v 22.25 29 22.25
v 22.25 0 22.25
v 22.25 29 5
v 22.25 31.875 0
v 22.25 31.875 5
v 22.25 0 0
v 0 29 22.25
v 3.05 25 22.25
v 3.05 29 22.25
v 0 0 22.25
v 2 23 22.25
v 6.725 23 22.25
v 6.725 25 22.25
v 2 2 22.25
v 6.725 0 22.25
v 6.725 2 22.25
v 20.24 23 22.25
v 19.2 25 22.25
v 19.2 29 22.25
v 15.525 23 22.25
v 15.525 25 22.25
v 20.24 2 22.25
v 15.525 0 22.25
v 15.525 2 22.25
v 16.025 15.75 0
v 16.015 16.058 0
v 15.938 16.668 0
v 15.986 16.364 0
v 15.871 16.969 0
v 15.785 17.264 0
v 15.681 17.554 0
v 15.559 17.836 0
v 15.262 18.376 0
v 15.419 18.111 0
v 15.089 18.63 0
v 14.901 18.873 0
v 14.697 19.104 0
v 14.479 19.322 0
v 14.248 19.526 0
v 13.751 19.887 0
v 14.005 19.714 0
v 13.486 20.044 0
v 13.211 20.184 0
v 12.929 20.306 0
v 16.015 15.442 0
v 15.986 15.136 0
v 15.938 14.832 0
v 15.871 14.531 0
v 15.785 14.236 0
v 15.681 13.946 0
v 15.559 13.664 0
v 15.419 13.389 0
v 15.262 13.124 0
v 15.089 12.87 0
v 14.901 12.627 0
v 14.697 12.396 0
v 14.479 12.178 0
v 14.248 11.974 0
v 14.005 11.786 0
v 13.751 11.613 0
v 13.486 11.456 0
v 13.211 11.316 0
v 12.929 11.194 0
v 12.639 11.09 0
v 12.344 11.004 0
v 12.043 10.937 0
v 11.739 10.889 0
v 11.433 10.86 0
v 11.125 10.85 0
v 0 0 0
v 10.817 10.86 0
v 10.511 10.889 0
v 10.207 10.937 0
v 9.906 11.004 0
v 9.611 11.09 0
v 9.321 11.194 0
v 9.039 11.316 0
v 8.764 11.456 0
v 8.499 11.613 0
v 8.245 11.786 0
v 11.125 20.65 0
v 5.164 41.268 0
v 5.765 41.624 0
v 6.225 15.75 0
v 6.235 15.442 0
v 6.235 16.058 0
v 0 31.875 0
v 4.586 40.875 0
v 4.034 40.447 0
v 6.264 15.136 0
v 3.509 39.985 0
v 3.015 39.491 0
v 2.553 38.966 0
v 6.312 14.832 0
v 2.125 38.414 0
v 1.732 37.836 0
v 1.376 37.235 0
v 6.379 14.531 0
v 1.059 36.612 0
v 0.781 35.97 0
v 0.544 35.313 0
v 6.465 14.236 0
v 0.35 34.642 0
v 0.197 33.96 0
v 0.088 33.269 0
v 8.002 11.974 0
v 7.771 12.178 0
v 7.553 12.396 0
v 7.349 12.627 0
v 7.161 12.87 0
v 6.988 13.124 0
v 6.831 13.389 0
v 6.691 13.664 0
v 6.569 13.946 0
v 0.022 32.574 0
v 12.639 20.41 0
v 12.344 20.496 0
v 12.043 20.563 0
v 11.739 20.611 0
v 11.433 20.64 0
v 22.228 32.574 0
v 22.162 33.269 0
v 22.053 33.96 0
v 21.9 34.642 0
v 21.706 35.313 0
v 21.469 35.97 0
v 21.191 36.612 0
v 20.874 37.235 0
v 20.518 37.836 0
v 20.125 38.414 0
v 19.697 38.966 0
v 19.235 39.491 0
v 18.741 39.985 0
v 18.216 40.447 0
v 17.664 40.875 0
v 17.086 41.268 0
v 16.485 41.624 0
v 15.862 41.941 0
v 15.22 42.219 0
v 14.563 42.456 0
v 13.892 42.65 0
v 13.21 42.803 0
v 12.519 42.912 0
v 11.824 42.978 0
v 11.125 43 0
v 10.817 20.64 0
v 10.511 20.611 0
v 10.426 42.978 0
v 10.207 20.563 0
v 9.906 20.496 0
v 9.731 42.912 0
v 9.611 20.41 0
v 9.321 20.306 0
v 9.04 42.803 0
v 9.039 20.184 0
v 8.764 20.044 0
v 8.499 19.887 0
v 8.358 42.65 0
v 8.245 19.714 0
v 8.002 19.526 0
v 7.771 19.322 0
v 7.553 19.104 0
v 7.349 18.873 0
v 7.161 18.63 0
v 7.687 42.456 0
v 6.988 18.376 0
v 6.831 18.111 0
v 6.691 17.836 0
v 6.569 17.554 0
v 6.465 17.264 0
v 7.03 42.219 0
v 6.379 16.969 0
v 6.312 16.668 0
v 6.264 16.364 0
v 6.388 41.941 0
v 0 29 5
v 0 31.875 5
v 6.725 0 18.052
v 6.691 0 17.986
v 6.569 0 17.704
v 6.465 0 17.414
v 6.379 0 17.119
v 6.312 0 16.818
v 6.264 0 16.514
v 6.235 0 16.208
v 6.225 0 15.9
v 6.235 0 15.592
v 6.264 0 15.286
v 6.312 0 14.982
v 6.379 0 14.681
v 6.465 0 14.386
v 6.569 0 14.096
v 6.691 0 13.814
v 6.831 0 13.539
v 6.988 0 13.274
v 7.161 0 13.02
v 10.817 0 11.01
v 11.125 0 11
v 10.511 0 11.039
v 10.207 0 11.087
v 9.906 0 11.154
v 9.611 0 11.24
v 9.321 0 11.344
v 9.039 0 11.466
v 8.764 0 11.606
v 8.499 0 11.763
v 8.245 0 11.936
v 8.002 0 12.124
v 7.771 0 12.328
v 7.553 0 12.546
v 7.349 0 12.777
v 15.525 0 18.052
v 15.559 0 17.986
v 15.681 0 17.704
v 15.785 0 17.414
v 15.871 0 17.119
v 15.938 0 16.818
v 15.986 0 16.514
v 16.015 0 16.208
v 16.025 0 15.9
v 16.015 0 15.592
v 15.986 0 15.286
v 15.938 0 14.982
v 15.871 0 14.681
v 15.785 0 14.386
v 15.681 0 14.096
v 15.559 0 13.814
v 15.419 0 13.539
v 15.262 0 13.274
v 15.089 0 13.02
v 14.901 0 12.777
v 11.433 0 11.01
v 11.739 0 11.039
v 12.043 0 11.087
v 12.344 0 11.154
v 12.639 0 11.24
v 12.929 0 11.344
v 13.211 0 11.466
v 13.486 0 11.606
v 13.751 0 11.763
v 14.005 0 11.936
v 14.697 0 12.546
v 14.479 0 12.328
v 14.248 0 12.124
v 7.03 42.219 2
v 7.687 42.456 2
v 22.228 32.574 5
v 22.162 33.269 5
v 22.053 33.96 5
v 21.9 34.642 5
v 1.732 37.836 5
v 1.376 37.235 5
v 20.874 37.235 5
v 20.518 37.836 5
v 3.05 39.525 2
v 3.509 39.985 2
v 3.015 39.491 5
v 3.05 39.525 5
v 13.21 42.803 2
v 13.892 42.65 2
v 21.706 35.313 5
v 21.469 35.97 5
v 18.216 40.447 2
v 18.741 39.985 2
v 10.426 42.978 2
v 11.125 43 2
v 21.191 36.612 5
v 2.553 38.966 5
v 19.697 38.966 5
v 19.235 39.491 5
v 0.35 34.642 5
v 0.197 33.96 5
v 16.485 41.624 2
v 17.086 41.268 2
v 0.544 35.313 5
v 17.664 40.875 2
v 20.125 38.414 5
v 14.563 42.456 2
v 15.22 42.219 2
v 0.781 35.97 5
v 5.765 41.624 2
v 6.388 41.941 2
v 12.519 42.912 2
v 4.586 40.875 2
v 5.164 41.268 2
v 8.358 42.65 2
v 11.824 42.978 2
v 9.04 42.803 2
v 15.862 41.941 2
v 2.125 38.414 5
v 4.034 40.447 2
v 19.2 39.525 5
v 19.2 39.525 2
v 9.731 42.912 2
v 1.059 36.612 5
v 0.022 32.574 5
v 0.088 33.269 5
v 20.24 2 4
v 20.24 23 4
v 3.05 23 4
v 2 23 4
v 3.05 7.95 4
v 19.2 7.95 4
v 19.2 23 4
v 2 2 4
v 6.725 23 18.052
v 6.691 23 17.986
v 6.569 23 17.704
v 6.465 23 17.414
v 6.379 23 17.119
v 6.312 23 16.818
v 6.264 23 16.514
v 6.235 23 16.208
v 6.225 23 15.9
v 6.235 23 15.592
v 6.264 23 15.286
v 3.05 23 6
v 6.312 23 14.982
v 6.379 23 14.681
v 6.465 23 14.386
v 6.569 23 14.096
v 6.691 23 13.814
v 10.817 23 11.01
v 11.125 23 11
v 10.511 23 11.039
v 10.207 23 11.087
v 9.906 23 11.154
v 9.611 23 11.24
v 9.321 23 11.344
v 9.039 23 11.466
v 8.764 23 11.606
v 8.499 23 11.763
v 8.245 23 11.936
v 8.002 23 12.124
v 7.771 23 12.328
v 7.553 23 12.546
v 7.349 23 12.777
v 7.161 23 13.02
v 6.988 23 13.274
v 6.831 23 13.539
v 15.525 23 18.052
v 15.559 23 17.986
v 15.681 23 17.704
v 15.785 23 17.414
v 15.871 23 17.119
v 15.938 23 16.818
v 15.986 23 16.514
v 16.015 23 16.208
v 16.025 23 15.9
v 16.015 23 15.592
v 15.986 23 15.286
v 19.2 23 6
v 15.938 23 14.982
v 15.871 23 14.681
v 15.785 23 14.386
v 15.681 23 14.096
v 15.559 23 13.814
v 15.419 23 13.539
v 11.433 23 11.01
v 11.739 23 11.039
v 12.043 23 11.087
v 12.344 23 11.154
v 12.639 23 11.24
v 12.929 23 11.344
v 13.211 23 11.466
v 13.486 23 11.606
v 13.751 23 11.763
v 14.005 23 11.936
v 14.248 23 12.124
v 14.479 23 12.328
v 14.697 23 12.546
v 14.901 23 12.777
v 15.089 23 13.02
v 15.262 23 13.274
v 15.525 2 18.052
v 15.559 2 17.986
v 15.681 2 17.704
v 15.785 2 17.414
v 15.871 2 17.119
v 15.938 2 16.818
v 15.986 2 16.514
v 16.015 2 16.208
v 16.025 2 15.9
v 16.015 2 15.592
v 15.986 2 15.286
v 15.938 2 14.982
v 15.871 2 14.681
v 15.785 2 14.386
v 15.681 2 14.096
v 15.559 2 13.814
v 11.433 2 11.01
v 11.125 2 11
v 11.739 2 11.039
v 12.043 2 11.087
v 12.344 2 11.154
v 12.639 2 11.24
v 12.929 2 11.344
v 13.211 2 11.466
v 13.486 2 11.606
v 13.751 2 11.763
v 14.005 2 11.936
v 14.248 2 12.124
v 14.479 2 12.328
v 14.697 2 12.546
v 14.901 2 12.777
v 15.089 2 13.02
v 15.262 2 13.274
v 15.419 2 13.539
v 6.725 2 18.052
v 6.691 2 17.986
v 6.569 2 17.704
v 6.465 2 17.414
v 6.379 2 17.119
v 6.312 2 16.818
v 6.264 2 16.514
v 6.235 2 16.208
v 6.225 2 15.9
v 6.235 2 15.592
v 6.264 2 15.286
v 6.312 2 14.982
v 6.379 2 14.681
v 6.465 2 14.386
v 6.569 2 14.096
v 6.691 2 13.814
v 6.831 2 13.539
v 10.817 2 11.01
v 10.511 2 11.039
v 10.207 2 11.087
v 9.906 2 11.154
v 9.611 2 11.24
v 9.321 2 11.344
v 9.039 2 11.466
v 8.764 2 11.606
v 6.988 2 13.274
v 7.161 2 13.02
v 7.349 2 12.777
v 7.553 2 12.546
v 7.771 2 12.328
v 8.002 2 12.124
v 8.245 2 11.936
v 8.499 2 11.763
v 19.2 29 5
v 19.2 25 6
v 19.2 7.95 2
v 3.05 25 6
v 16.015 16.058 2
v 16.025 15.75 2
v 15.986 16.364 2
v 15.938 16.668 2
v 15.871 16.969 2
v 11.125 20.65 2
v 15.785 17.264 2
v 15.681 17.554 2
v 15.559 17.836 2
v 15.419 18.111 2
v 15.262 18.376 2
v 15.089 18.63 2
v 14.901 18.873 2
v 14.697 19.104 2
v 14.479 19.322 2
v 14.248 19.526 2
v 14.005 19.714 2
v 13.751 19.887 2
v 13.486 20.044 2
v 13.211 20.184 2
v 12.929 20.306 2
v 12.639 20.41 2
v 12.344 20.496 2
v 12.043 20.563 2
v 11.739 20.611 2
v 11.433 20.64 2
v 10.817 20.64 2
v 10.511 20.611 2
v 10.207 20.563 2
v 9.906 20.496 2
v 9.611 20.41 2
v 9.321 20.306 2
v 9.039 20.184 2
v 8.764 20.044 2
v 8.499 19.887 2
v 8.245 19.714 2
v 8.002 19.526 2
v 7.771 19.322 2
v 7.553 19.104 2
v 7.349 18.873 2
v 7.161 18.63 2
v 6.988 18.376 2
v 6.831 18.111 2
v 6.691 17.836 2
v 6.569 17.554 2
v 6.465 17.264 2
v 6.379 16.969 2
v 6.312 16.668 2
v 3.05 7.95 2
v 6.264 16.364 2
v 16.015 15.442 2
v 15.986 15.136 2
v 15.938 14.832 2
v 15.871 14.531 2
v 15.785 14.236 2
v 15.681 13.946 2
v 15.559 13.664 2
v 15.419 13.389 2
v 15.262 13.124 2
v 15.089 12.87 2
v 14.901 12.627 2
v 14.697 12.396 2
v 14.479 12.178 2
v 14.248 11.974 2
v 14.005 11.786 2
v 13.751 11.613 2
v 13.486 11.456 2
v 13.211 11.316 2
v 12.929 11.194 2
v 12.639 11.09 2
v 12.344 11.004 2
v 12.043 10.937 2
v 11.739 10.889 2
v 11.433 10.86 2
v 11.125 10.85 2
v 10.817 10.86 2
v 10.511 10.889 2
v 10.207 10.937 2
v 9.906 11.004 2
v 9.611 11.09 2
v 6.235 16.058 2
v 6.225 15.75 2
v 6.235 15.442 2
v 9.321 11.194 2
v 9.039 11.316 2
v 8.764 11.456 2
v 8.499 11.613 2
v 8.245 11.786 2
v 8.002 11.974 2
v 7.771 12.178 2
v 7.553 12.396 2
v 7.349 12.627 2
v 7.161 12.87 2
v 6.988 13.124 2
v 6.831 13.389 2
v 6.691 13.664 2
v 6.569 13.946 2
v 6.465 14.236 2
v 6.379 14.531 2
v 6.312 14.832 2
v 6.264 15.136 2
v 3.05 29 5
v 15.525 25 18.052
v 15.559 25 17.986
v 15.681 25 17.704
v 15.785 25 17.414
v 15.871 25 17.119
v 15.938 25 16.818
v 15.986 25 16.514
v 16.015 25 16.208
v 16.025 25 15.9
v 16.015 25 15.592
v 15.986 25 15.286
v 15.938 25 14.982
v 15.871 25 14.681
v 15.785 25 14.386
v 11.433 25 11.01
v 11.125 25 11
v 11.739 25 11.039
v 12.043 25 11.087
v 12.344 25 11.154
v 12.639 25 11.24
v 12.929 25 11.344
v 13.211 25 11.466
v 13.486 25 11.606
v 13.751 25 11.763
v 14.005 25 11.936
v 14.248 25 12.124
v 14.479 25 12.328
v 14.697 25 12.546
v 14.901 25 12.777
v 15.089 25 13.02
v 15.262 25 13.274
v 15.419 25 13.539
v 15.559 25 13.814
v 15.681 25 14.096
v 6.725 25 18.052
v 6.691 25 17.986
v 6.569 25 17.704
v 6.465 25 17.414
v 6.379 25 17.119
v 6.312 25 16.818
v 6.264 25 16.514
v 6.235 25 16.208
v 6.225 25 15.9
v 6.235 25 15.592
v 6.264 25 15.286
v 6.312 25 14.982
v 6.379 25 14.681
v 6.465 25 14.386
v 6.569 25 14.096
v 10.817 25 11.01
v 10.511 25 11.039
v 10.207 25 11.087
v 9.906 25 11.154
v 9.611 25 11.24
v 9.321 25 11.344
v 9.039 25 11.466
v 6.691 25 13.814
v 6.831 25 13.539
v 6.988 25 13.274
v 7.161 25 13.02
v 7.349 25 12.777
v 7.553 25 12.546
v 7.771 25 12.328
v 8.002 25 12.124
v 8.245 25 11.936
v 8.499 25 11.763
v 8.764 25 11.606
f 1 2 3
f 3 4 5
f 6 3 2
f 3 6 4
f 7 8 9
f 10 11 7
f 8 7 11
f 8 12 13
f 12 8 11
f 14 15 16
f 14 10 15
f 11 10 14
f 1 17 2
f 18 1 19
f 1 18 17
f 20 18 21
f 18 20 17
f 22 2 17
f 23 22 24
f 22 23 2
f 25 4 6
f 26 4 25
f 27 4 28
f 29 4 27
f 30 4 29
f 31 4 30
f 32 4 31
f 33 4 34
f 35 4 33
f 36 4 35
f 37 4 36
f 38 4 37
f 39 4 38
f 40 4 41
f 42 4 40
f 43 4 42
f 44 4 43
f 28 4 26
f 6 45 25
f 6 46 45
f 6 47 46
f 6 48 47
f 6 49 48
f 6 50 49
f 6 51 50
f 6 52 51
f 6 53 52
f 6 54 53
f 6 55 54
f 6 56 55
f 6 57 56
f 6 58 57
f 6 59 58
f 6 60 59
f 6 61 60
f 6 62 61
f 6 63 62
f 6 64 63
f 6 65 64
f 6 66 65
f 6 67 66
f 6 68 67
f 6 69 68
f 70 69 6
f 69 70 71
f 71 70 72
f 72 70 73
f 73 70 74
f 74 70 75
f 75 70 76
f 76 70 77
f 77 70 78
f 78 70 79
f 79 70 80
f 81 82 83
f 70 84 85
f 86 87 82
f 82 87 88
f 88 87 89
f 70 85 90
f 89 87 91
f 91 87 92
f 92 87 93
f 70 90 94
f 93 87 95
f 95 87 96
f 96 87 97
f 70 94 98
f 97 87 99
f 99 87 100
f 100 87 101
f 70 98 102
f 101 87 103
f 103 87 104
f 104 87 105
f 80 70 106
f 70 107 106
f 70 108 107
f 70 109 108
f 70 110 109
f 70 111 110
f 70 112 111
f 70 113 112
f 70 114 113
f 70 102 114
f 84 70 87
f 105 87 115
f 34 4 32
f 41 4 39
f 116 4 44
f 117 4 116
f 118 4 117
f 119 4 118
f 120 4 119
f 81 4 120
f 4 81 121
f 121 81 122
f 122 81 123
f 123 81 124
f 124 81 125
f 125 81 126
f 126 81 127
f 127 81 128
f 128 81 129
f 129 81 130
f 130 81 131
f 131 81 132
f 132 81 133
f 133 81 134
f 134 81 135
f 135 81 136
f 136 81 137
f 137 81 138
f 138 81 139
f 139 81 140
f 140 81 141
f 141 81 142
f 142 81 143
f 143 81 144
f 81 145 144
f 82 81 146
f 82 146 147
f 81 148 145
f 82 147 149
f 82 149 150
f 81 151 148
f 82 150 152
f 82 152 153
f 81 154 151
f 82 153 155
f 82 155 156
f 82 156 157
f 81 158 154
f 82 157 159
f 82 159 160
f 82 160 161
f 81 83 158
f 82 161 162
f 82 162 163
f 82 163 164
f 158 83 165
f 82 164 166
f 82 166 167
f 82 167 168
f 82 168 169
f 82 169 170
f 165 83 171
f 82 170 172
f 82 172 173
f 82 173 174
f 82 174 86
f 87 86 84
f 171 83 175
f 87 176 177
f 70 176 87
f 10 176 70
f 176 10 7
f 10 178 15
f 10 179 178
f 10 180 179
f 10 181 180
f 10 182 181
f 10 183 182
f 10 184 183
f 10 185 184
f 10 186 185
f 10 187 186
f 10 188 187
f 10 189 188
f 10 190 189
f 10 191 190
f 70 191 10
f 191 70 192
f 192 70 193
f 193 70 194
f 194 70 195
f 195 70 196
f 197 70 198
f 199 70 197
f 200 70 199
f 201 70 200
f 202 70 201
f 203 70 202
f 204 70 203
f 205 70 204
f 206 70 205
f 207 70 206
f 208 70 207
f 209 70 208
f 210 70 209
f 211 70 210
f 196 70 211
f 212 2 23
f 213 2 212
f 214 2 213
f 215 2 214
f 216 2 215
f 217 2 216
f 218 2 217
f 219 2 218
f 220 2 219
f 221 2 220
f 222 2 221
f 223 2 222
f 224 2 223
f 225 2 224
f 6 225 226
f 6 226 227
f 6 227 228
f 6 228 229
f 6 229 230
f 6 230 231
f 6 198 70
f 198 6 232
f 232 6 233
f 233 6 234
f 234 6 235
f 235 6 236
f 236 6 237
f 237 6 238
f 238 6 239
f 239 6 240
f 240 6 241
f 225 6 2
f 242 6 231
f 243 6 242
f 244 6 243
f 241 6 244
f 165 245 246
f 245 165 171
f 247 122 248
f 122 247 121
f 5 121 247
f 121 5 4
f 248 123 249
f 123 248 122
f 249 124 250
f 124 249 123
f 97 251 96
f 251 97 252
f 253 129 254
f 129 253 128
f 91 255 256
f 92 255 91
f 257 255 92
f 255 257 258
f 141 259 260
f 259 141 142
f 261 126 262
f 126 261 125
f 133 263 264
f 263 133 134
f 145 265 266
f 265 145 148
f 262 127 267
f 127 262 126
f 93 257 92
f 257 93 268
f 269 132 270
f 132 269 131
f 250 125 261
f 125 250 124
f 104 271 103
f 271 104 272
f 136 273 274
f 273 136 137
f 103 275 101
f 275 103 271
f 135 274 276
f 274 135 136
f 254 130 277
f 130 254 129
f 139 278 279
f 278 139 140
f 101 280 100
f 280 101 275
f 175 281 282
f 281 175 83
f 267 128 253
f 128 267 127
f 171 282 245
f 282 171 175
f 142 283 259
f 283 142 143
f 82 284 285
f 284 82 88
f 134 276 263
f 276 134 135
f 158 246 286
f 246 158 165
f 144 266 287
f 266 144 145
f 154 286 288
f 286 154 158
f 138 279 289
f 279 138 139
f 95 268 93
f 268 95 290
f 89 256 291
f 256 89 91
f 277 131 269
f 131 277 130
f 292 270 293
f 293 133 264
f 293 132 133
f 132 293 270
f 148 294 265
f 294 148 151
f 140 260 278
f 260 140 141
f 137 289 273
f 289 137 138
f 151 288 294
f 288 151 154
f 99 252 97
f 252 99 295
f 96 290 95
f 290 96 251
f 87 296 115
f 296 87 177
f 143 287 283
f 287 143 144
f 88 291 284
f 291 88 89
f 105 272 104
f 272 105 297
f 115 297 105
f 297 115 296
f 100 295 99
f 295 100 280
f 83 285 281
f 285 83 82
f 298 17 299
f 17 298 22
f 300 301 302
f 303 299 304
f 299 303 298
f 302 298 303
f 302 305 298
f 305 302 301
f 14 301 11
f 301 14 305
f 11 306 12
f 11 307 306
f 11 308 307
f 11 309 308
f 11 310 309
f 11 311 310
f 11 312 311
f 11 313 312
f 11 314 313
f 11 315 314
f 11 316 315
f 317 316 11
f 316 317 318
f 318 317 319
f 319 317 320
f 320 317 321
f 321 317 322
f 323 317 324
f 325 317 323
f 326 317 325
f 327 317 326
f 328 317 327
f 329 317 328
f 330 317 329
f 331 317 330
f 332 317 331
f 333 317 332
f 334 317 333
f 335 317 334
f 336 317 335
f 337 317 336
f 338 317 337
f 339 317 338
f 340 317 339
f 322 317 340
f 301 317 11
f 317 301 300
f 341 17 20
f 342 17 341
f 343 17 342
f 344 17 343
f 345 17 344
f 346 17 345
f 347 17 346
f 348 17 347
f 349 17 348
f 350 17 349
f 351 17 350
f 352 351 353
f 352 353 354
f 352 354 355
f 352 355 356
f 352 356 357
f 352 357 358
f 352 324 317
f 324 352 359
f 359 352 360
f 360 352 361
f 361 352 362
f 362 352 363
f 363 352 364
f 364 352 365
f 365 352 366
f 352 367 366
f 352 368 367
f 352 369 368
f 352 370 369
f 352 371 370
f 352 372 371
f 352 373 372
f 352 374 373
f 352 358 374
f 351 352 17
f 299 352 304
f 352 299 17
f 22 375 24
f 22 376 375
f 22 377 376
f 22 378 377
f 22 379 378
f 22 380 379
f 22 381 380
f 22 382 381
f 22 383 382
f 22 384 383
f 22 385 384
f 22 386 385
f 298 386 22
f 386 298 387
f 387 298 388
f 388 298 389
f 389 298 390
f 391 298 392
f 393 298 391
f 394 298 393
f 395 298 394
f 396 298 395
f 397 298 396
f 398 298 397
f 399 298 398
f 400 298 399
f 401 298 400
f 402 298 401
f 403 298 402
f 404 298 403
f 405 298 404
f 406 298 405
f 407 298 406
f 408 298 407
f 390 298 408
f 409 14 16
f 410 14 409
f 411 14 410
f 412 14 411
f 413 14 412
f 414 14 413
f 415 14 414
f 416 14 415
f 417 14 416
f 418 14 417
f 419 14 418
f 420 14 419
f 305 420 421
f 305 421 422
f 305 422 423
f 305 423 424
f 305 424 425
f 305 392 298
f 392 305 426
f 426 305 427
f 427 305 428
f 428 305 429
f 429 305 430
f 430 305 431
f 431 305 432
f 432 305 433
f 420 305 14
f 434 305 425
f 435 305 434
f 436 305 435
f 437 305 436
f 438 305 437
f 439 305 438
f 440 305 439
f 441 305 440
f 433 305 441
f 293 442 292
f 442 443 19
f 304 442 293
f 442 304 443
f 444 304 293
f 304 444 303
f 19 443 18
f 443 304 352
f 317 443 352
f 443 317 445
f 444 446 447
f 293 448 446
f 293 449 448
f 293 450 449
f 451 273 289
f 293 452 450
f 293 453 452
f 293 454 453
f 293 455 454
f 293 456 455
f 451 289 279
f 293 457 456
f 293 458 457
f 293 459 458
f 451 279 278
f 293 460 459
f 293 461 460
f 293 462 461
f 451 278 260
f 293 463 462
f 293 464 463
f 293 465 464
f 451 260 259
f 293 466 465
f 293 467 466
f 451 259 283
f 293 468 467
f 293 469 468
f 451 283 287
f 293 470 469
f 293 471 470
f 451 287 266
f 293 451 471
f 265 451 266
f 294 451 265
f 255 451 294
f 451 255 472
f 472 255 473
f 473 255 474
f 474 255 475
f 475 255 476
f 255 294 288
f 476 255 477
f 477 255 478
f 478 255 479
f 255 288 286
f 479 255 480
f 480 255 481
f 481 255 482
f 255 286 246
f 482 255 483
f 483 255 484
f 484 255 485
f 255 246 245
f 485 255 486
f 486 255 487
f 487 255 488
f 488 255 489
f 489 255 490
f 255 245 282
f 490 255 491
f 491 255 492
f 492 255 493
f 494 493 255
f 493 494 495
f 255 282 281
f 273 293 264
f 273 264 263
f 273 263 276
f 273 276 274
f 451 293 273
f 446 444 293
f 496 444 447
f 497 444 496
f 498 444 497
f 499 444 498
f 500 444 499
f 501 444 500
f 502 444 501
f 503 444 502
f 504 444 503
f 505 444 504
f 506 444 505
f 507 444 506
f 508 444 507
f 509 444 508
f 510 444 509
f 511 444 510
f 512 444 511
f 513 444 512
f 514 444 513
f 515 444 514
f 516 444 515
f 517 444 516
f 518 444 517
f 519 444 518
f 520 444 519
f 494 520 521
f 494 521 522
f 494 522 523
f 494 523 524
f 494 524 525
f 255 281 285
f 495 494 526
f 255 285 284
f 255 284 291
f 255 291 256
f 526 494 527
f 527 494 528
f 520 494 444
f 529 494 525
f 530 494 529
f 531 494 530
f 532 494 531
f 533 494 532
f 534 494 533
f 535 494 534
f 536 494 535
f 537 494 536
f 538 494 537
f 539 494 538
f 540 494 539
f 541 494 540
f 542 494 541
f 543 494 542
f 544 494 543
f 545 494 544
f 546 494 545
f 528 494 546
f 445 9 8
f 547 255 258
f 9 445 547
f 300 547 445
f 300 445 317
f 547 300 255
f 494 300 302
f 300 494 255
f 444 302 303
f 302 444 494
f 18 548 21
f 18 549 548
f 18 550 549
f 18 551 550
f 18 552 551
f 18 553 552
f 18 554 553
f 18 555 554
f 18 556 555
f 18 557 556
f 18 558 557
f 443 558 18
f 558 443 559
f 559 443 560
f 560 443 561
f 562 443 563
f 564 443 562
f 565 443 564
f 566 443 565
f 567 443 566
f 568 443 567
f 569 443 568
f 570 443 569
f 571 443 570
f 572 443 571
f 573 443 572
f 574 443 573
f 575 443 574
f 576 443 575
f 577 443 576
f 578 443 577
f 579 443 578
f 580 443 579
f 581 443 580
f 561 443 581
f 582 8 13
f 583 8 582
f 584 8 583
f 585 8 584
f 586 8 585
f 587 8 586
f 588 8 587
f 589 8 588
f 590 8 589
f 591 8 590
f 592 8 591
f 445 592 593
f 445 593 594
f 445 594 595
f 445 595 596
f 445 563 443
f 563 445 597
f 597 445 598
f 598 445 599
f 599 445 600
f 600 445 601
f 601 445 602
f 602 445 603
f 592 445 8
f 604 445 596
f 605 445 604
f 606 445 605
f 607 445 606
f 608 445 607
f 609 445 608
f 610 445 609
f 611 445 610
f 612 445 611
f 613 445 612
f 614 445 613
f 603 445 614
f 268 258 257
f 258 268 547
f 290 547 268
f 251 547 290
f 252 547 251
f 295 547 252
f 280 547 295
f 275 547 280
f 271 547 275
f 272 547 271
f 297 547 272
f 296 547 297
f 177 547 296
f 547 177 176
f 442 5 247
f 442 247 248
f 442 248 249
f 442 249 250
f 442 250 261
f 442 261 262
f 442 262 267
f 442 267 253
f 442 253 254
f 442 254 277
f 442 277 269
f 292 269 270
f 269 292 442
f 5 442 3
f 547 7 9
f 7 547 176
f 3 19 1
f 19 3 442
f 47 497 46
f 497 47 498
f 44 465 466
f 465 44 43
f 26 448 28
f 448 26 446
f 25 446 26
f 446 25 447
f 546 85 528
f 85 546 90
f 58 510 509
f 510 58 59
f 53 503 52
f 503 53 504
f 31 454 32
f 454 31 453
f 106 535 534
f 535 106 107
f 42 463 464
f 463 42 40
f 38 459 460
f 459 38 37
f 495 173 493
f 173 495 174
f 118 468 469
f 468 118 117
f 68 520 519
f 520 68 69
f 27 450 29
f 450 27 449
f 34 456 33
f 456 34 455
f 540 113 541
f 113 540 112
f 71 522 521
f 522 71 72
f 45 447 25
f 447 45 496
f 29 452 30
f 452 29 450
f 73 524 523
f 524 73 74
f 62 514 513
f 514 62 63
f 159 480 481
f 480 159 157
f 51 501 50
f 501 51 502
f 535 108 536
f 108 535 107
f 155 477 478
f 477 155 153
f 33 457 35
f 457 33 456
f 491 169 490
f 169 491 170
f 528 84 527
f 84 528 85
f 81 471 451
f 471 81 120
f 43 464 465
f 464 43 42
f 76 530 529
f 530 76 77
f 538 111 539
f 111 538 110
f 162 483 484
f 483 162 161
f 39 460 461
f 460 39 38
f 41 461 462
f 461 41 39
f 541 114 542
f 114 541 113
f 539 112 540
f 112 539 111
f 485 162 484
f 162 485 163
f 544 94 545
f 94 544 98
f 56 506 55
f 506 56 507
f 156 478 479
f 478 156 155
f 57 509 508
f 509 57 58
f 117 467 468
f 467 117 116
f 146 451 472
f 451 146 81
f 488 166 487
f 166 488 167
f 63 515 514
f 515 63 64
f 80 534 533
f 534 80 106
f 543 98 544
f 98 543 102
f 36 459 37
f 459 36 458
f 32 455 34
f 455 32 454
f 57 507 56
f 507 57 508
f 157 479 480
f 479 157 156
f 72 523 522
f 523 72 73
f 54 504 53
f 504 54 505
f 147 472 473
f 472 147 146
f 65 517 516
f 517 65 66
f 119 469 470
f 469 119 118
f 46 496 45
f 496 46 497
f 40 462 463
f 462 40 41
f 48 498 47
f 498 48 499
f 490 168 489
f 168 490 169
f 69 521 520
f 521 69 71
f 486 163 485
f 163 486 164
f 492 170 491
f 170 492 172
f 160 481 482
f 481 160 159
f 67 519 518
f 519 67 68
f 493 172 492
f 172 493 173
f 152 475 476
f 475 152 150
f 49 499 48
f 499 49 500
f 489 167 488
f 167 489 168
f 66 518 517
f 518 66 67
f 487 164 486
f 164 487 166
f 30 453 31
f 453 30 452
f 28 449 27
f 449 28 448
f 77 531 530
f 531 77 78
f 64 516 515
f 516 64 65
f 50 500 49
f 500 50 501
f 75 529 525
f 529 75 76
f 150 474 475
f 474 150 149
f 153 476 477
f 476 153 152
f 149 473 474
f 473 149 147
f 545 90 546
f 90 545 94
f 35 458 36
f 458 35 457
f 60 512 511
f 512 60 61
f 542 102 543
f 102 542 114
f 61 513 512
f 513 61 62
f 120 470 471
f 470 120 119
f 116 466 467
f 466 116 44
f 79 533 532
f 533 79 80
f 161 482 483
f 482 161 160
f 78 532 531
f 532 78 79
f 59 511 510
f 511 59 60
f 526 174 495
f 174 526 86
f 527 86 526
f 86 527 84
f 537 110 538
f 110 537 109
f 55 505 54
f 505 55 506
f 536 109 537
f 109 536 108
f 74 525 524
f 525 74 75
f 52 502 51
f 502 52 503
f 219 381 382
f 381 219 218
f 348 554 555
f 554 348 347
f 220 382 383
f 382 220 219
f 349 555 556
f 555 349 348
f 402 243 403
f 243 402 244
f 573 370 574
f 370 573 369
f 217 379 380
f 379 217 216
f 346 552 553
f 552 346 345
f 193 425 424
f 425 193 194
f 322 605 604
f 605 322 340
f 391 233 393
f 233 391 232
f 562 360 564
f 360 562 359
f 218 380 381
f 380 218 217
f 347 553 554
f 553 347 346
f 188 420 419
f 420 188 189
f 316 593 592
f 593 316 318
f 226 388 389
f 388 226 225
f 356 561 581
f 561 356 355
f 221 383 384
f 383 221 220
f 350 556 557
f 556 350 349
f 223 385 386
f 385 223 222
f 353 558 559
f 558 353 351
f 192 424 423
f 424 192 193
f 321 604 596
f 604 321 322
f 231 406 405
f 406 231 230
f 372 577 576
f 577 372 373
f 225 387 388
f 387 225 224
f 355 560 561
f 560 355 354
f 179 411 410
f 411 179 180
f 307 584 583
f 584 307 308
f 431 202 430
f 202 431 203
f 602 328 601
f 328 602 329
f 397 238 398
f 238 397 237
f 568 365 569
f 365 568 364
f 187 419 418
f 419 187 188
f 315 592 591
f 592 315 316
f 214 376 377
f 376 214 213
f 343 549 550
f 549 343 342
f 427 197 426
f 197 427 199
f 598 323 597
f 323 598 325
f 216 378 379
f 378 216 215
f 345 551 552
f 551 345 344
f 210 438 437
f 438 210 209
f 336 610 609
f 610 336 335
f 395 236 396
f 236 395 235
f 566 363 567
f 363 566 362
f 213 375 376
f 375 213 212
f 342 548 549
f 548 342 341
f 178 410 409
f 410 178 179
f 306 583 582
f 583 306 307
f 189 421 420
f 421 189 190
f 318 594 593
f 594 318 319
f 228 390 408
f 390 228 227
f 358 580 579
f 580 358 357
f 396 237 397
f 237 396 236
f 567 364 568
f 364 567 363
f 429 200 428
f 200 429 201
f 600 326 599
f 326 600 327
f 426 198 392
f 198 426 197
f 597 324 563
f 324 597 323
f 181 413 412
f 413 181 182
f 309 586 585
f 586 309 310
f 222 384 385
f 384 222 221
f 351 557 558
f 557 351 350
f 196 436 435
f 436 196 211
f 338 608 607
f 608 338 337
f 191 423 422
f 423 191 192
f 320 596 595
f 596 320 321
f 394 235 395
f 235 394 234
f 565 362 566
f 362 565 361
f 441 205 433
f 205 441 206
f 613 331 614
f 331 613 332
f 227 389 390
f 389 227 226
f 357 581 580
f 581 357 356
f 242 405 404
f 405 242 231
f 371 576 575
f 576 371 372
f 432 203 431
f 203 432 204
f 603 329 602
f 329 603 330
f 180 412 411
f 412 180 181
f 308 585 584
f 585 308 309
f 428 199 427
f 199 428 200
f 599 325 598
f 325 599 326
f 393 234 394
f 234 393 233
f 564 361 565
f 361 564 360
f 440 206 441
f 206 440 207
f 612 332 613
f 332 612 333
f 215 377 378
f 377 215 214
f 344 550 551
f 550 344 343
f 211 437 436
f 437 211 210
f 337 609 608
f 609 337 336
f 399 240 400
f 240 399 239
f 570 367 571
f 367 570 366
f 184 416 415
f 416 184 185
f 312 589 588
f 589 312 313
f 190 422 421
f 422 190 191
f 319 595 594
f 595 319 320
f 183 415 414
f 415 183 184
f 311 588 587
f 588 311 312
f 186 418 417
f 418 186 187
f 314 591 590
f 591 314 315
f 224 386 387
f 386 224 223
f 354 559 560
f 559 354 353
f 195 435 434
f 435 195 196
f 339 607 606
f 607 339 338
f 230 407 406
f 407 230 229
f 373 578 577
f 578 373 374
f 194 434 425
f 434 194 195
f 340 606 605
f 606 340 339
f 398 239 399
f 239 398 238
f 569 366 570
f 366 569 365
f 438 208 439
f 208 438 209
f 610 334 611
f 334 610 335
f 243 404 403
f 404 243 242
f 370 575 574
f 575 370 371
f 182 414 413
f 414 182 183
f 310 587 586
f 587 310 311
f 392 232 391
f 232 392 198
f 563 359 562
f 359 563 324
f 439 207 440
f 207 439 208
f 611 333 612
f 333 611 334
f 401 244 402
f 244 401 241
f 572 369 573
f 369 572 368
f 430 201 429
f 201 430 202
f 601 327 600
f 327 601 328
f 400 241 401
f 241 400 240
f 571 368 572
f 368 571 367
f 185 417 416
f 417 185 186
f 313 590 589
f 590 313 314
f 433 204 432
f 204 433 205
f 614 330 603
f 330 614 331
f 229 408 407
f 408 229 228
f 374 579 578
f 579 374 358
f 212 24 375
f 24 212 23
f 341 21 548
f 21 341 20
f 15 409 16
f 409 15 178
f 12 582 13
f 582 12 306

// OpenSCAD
// 22.25
// 43.00
// 22.32



//--main frame
module Main_frame(){
cube([22.25,43-22.25/2,22.25], false);
translate([(22.25/2),43-22.25/2,0]) {
    cylinder($fn=100,22.25, d = 22.25,true);
}
}

//--shaft hole
module Shaft_hole() {
    rotate([90,0,0]){
    translate([22.25/2,15.9,-80]){
        cylinder($fn=100,100,d=9.8,true);
        }
    }
}

module Upper_Slot() {
    translate([22.25/2,0,18.5]){
      // rotate([0,45,0]){
        cube([8.8,100,8.8],true);
        }
   // }
}

module Lower_Slot() {
    translate([0,14,-6]){
      // rotate([0,45,0]){
        cube([16,30,6.5],true);
        }
   // }
}

module Vertical_Cuts() {
//--back cut 1
    translate([2,2,4]) {
        cube([18.24,21,22.25], false);
      }
//--back cut 2 - nut recess
    translate([3.05,7.95,2]) {
        cube([16.15,30,4], false);
      }

    //--front slot 1
    translate([3.05,25,2]) {
        cube([16.15,30,25], false);
        }
        
    //--front slot 2
    translate([-1,29,5]) {
        cube([35,30,25], false);
       }
    
    //--back hole
    translate([22.25/2,15.75,-1]) {
        rotate([0,0,0]){    
            cylinder($fn=100,80,d=9.8,false);
        }
    }
  
}

//--combine objects
difference() {
    Main_frame();
    Shaft_hole();
    Upper_Slot();
   // Lower_Slot();
    Vertical_Cuts();
}  
